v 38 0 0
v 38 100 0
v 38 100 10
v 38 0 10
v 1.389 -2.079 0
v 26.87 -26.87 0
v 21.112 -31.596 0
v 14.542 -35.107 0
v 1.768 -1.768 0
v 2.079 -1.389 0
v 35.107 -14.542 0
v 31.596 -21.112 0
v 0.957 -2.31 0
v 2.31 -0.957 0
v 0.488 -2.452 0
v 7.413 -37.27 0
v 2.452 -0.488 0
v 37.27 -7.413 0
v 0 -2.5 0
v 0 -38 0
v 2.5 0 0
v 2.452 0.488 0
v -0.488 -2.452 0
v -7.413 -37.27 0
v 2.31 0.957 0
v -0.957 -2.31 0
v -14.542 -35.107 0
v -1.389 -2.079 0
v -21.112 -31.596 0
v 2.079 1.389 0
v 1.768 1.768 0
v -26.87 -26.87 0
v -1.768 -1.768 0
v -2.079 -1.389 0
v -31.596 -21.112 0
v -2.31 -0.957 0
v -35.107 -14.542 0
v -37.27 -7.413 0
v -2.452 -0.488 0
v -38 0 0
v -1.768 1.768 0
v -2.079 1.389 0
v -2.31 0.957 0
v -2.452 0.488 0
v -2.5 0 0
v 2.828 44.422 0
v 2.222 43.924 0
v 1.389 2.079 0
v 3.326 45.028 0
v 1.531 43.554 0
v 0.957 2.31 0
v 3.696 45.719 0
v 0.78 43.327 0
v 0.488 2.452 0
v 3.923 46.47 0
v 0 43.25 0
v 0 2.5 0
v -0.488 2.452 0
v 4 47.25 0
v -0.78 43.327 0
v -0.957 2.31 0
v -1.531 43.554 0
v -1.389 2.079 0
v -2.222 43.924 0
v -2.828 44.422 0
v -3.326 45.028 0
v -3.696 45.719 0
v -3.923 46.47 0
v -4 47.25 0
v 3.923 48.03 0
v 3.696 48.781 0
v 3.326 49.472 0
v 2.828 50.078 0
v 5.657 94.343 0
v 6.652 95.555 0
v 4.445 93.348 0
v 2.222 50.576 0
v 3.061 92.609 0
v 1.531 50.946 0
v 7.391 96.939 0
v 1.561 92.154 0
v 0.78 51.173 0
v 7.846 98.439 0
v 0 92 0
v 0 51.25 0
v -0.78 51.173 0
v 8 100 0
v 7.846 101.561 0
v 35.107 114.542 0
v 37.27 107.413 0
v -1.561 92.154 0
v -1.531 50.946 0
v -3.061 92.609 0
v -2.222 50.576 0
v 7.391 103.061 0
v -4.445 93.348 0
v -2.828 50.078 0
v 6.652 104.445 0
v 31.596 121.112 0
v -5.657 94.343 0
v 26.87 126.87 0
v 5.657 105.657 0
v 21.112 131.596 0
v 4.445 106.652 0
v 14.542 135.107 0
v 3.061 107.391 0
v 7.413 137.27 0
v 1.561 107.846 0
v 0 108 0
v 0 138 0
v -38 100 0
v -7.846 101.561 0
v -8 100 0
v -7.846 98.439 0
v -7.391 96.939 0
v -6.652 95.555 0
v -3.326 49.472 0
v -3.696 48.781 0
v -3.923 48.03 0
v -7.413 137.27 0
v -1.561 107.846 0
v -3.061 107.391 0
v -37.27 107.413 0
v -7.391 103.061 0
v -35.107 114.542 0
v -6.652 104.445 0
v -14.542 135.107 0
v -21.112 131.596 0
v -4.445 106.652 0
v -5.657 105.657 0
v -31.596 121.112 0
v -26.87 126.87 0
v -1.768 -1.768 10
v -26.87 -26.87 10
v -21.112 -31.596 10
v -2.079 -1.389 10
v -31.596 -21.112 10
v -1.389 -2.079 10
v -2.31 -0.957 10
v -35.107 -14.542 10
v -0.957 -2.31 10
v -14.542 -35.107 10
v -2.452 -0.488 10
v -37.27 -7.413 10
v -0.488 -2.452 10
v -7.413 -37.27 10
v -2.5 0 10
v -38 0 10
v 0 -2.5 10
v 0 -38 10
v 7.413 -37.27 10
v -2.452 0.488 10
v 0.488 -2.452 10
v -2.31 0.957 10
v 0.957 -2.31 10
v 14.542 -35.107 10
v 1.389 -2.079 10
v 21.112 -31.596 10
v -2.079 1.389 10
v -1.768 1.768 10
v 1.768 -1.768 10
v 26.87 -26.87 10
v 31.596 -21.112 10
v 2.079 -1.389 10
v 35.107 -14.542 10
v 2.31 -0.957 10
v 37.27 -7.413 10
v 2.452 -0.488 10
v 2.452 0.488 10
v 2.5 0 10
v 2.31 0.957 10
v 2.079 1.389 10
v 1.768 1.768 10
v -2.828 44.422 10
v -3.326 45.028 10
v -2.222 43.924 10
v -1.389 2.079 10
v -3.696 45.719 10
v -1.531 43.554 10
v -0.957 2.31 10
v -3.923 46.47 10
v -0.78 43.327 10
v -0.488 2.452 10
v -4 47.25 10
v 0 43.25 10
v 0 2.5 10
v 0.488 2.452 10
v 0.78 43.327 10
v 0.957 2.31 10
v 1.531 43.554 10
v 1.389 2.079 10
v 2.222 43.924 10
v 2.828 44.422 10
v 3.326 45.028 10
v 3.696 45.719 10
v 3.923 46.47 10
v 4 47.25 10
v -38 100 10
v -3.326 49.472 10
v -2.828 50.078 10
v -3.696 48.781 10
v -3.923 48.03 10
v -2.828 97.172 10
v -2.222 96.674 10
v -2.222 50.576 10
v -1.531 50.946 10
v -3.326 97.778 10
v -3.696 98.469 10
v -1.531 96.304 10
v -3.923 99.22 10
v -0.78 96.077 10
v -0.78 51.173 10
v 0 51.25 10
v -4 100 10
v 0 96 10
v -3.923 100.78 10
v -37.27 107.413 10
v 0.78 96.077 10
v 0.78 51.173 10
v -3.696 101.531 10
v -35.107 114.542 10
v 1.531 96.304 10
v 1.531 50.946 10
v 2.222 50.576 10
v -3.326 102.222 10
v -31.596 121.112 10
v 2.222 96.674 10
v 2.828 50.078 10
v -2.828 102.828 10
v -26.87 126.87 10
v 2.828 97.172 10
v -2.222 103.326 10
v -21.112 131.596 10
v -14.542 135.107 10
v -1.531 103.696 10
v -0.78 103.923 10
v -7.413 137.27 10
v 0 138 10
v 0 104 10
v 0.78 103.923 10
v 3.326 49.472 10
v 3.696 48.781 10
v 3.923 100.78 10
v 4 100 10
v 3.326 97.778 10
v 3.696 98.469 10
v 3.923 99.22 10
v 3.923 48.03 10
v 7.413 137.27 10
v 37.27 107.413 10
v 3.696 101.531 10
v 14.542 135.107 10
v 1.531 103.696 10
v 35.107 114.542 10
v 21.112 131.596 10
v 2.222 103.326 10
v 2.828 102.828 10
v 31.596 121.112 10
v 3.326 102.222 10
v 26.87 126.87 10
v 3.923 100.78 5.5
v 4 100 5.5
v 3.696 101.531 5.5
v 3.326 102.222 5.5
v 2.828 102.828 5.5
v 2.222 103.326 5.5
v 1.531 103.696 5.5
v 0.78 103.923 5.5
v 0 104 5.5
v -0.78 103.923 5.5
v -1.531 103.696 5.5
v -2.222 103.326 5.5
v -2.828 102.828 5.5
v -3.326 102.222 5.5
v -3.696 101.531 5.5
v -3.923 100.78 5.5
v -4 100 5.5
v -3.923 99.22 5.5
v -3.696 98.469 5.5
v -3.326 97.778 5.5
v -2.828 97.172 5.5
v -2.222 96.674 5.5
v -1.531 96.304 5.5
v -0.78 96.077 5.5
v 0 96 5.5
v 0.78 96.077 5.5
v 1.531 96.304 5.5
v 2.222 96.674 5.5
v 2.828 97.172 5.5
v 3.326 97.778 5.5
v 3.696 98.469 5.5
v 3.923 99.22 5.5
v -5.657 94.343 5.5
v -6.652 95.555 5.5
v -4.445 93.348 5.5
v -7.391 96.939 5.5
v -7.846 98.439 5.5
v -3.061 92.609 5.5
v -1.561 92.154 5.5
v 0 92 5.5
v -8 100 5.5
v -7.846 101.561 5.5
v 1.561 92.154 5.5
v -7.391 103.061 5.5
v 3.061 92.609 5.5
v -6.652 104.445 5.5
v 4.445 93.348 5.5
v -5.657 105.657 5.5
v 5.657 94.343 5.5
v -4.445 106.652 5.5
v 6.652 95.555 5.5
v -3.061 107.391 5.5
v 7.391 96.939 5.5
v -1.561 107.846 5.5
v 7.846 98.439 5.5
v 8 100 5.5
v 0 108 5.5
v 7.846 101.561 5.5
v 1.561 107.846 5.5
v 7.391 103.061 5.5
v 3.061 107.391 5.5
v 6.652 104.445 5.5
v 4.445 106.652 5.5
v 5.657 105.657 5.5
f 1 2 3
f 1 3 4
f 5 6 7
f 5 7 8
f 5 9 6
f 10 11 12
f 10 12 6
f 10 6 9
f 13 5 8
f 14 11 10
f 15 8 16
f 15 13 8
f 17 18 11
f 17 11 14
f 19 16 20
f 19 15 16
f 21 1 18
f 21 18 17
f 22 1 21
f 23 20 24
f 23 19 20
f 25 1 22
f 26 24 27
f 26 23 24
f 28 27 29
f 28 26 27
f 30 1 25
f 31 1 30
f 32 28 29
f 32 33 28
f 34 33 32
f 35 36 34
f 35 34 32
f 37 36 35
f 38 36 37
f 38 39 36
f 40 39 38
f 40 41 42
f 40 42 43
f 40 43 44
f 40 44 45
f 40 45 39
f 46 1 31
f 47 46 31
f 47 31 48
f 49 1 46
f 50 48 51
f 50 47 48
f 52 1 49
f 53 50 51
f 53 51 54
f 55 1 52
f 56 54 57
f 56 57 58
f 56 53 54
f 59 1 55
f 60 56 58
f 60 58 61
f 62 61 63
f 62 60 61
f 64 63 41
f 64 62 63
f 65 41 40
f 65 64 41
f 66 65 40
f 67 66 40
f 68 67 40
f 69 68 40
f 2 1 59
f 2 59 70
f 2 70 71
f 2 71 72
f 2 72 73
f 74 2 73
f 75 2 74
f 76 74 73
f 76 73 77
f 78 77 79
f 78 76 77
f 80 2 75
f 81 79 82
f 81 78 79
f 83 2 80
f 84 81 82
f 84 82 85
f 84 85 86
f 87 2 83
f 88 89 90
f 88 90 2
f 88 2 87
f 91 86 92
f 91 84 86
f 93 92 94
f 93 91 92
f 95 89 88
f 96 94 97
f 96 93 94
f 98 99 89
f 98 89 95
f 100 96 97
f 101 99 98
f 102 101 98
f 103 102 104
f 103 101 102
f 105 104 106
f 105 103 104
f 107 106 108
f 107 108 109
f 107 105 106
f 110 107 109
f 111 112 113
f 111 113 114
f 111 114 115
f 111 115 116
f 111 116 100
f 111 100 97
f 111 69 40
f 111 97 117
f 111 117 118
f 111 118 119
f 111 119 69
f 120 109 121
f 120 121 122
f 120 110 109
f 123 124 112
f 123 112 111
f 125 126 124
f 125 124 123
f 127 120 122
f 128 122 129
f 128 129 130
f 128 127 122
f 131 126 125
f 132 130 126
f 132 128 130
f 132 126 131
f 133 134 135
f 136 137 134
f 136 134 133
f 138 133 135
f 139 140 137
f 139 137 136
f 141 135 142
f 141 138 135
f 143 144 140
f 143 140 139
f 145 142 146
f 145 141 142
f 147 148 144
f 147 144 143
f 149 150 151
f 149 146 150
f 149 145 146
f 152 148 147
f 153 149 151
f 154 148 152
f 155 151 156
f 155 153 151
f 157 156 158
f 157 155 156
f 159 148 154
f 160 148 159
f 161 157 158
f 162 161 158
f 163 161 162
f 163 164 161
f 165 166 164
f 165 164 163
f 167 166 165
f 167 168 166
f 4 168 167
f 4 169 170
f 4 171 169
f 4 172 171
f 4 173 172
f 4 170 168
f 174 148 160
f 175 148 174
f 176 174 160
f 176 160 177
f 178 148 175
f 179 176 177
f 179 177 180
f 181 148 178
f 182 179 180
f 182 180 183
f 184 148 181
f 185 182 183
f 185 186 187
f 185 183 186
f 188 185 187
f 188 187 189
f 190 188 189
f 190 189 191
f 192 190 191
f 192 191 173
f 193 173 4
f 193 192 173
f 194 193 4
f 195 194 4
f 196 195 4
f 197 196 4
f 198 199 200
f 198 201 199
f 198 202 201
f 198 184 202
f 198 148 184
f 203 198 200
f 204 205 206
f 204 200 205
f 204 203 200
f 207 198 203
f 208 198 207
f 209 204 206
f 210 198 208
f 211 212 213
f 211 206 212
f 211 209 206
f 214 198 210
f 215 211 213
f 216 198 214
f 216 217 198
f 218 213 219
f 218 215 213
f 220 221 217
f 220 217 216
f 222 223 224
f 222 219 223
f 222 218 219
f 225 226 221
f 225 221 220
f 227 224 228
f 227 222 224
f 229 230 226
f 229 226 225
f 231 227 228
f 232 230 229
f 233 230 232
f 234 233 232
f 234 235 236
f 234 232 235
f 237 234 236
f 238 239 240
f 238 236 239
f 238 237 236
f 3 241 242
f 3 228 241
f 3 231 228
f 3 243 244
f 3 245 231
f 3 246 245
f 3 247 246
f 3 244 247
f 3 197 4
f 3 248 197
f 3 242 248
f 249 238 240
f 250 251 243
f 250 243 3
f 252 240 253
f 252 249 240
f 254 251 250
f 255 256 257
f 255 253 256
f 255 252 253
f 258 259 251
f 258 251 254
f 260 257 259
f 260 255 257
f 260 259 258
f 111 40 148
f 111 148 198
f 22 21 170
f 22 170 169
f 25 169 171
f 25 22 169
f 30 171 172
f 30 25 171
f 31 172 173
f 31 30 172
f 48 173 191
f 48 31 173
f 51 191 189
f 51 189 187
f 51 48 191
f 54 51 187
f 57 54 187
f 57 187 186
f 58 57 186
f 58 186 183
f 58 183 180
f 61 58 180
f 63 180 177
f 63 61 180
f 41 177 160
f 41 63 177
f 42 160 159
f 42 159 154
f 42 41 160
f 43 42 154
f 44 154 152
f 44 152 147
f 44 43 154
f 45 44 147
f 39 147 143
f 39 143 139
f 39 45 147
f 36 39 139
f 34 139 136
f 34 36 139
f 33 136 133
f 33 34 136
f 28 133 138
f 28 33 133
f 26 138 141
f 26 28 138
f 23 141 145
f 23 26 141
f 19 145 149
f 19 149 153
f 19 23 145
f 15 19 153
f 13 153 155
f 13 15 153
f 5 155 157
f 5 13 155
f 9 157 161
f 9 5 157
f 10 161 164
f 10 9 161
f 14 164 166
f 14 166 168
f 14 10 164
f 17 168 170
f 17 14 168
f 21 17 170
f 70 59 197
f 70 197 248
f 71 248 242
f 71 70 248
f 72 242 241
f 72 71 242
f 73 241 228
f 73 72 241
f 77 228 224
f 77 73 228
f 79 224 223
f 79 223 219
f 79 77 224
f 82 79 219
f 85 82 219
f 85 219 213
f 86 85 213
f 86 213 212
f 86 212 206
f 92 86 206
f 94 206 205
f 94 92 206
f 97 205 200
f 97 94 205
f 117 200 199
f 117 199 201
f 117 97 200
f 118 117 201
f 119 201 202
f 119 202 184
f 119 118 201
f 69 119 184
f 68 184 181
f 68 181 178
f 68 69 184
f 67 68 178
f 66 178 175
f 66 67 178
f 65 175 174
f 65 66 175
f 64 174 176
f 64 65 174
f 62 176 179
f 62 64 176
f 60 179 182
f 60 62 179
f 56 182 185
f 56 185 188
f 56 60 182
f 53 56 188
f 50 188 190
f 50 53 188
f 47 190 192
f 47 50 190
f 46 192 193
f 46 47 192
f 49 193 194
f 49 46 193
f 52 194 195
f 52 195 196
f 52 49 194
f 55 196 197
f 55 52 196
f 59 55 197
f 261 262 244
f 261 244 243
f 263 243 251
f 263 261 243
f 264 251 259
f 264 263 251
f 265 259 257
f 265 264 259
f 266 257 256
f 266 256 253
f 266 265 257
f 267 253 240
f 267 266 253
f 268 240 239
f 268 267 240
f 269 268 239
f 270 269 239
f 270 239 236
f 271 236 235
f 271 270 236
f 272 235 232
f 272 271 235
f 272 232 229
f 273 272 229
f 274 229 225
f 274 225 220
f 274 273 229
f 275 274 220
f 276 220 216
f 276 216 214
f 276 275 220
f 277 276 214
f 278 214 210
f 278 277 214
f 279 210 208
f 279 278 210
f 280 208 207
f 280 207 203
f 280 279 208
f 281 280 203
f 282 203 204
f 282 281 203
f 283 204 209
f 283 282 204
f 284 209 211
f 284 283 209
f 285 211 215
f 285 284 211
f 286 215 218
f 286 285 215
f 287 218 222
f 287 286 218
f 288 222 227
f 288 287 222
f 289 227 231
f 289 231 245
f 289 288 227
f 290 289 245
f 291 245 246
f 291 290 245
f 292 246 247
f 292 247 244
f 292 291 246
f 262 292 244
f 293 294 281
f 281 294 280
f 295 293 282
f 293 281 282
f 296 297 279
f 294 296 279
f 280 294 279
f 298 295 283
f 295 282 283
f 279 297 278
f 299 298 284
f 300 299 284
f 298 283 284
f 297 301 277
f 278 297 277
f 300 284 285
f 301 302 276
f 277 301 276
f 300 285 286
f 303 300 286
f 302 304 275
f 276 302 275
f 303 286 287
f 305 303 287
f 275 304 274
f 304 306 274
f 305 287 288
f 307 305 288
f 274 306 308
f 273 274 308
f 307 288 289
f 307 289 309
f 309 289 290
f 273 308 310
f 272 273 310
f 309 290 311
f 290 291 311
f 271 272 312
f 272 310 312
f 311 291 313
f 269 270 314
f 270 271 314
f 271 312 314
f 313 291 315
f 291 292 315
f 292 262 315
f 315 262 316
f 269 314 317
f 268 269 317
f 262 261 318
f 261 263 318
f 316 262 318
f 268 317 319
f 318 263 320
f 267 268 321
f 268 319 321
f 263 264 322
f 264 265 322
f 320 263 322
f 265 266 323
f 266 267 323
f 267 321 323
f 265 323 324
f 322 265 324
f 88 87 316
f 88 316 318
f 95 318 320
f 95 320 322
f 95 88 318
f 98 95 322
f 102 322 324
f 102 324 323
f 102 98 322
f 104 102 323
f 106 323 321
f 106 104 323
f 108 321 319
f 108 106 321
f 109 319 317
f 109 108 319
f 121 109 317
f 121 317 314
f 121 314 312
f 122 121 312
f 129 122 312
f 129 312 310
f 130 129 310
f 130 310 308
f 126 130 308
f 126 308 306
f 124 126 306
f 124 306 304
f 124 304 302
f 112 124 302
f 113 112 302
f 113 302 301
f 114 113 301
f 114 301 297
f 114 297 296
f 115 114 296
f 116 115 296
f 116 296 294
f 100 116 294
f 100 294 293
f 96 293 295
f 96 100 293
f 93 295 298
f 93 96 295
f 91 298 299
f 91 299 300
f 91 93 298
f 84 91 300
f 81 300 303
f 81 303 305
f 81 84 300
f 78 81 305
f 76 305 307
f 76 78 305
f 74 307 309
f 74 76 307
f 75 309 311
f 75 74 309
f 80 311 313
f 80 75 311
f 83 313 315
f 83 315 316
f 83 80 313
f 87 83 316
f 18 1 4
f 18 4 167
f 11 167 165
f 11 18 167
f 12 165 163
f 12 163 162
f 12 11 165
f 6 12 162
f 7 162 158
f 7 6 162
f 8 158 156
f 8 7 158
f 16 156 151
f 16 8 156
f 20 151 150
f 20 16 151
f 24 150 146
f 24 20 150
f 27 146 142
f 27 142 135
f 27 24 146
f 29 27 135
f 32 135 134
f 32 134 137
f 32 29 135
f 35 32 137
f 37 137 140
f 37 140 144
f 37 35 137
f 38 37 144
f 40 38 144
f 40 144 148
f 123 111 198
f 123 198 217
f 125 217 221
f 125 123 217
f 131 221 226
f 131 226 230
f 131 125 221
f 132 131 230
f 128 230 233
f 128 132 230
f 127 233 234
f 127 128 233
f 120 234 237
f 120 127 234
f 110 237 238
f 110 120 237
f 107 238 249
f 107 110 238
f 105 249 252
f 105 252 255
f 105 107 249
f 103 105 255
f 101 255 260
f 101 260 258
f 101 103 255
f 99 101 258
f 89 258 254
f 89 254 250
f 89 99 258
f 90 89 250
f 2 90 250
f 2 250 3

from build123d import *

# Parameters (mm, degrees)
CROQUIS1_R              = 2.5
CROQUIS1_R_2            = 8
CROQUIS1_R_3            = 4
SALIENTE_EXTRUIR1_DEPTH = 10
SALIENTE_EXTRUIR2_START = -4.5
CROQUIS2_R              = 8
CROQUIS2_R_2            = 4
SALIENTE_EXTRUIR2_DEPTH = 4.5


with BuildPart() as part:
    # Croquis1 → Saliente-Extruir1 (new body)
    with BuildSketch(Plane.XY):
        with BuildLine():
            Line((-38, 0), (-38, 100))
            ThreePointArc((-38, 100), (0, 138), (38, 100))
            Line((38, 100), (38, 0))
            ThreePointArc((38, 0), (0, -38), (-38, 0))
        make_face()
        Circle(CROQUIS1_R, mode=Mode.SUBTRACT)
        with Locations((0, 100)):
            Circle(CROQUIS1_R_2, mode=Mode.SUBTRACT)
        with Locations((0, 47.25)):
            Circle(CROQUIS1_R_3, mode=Mode.SUBTRACT)
    extrude(amount=SALIENTE_EXTRUIR1_DEPTH)

    # Croquis2 → Saliente-Extruir2 (add)
    with BuildSketch(Plane.XY.offset(10).offset(SALIENTE_EXTRUIR2_START)):
        with Locations((0, 100)):
            Circle(CROQUIS2_R)
        with Locations((0, 100)):
            Circle(CROQUIS2_R_2, mode=Mode.SUBTRACT)
    extrude(amount=SALIENTE_EXTRUIR2_DEPTH)


solid = part.part
